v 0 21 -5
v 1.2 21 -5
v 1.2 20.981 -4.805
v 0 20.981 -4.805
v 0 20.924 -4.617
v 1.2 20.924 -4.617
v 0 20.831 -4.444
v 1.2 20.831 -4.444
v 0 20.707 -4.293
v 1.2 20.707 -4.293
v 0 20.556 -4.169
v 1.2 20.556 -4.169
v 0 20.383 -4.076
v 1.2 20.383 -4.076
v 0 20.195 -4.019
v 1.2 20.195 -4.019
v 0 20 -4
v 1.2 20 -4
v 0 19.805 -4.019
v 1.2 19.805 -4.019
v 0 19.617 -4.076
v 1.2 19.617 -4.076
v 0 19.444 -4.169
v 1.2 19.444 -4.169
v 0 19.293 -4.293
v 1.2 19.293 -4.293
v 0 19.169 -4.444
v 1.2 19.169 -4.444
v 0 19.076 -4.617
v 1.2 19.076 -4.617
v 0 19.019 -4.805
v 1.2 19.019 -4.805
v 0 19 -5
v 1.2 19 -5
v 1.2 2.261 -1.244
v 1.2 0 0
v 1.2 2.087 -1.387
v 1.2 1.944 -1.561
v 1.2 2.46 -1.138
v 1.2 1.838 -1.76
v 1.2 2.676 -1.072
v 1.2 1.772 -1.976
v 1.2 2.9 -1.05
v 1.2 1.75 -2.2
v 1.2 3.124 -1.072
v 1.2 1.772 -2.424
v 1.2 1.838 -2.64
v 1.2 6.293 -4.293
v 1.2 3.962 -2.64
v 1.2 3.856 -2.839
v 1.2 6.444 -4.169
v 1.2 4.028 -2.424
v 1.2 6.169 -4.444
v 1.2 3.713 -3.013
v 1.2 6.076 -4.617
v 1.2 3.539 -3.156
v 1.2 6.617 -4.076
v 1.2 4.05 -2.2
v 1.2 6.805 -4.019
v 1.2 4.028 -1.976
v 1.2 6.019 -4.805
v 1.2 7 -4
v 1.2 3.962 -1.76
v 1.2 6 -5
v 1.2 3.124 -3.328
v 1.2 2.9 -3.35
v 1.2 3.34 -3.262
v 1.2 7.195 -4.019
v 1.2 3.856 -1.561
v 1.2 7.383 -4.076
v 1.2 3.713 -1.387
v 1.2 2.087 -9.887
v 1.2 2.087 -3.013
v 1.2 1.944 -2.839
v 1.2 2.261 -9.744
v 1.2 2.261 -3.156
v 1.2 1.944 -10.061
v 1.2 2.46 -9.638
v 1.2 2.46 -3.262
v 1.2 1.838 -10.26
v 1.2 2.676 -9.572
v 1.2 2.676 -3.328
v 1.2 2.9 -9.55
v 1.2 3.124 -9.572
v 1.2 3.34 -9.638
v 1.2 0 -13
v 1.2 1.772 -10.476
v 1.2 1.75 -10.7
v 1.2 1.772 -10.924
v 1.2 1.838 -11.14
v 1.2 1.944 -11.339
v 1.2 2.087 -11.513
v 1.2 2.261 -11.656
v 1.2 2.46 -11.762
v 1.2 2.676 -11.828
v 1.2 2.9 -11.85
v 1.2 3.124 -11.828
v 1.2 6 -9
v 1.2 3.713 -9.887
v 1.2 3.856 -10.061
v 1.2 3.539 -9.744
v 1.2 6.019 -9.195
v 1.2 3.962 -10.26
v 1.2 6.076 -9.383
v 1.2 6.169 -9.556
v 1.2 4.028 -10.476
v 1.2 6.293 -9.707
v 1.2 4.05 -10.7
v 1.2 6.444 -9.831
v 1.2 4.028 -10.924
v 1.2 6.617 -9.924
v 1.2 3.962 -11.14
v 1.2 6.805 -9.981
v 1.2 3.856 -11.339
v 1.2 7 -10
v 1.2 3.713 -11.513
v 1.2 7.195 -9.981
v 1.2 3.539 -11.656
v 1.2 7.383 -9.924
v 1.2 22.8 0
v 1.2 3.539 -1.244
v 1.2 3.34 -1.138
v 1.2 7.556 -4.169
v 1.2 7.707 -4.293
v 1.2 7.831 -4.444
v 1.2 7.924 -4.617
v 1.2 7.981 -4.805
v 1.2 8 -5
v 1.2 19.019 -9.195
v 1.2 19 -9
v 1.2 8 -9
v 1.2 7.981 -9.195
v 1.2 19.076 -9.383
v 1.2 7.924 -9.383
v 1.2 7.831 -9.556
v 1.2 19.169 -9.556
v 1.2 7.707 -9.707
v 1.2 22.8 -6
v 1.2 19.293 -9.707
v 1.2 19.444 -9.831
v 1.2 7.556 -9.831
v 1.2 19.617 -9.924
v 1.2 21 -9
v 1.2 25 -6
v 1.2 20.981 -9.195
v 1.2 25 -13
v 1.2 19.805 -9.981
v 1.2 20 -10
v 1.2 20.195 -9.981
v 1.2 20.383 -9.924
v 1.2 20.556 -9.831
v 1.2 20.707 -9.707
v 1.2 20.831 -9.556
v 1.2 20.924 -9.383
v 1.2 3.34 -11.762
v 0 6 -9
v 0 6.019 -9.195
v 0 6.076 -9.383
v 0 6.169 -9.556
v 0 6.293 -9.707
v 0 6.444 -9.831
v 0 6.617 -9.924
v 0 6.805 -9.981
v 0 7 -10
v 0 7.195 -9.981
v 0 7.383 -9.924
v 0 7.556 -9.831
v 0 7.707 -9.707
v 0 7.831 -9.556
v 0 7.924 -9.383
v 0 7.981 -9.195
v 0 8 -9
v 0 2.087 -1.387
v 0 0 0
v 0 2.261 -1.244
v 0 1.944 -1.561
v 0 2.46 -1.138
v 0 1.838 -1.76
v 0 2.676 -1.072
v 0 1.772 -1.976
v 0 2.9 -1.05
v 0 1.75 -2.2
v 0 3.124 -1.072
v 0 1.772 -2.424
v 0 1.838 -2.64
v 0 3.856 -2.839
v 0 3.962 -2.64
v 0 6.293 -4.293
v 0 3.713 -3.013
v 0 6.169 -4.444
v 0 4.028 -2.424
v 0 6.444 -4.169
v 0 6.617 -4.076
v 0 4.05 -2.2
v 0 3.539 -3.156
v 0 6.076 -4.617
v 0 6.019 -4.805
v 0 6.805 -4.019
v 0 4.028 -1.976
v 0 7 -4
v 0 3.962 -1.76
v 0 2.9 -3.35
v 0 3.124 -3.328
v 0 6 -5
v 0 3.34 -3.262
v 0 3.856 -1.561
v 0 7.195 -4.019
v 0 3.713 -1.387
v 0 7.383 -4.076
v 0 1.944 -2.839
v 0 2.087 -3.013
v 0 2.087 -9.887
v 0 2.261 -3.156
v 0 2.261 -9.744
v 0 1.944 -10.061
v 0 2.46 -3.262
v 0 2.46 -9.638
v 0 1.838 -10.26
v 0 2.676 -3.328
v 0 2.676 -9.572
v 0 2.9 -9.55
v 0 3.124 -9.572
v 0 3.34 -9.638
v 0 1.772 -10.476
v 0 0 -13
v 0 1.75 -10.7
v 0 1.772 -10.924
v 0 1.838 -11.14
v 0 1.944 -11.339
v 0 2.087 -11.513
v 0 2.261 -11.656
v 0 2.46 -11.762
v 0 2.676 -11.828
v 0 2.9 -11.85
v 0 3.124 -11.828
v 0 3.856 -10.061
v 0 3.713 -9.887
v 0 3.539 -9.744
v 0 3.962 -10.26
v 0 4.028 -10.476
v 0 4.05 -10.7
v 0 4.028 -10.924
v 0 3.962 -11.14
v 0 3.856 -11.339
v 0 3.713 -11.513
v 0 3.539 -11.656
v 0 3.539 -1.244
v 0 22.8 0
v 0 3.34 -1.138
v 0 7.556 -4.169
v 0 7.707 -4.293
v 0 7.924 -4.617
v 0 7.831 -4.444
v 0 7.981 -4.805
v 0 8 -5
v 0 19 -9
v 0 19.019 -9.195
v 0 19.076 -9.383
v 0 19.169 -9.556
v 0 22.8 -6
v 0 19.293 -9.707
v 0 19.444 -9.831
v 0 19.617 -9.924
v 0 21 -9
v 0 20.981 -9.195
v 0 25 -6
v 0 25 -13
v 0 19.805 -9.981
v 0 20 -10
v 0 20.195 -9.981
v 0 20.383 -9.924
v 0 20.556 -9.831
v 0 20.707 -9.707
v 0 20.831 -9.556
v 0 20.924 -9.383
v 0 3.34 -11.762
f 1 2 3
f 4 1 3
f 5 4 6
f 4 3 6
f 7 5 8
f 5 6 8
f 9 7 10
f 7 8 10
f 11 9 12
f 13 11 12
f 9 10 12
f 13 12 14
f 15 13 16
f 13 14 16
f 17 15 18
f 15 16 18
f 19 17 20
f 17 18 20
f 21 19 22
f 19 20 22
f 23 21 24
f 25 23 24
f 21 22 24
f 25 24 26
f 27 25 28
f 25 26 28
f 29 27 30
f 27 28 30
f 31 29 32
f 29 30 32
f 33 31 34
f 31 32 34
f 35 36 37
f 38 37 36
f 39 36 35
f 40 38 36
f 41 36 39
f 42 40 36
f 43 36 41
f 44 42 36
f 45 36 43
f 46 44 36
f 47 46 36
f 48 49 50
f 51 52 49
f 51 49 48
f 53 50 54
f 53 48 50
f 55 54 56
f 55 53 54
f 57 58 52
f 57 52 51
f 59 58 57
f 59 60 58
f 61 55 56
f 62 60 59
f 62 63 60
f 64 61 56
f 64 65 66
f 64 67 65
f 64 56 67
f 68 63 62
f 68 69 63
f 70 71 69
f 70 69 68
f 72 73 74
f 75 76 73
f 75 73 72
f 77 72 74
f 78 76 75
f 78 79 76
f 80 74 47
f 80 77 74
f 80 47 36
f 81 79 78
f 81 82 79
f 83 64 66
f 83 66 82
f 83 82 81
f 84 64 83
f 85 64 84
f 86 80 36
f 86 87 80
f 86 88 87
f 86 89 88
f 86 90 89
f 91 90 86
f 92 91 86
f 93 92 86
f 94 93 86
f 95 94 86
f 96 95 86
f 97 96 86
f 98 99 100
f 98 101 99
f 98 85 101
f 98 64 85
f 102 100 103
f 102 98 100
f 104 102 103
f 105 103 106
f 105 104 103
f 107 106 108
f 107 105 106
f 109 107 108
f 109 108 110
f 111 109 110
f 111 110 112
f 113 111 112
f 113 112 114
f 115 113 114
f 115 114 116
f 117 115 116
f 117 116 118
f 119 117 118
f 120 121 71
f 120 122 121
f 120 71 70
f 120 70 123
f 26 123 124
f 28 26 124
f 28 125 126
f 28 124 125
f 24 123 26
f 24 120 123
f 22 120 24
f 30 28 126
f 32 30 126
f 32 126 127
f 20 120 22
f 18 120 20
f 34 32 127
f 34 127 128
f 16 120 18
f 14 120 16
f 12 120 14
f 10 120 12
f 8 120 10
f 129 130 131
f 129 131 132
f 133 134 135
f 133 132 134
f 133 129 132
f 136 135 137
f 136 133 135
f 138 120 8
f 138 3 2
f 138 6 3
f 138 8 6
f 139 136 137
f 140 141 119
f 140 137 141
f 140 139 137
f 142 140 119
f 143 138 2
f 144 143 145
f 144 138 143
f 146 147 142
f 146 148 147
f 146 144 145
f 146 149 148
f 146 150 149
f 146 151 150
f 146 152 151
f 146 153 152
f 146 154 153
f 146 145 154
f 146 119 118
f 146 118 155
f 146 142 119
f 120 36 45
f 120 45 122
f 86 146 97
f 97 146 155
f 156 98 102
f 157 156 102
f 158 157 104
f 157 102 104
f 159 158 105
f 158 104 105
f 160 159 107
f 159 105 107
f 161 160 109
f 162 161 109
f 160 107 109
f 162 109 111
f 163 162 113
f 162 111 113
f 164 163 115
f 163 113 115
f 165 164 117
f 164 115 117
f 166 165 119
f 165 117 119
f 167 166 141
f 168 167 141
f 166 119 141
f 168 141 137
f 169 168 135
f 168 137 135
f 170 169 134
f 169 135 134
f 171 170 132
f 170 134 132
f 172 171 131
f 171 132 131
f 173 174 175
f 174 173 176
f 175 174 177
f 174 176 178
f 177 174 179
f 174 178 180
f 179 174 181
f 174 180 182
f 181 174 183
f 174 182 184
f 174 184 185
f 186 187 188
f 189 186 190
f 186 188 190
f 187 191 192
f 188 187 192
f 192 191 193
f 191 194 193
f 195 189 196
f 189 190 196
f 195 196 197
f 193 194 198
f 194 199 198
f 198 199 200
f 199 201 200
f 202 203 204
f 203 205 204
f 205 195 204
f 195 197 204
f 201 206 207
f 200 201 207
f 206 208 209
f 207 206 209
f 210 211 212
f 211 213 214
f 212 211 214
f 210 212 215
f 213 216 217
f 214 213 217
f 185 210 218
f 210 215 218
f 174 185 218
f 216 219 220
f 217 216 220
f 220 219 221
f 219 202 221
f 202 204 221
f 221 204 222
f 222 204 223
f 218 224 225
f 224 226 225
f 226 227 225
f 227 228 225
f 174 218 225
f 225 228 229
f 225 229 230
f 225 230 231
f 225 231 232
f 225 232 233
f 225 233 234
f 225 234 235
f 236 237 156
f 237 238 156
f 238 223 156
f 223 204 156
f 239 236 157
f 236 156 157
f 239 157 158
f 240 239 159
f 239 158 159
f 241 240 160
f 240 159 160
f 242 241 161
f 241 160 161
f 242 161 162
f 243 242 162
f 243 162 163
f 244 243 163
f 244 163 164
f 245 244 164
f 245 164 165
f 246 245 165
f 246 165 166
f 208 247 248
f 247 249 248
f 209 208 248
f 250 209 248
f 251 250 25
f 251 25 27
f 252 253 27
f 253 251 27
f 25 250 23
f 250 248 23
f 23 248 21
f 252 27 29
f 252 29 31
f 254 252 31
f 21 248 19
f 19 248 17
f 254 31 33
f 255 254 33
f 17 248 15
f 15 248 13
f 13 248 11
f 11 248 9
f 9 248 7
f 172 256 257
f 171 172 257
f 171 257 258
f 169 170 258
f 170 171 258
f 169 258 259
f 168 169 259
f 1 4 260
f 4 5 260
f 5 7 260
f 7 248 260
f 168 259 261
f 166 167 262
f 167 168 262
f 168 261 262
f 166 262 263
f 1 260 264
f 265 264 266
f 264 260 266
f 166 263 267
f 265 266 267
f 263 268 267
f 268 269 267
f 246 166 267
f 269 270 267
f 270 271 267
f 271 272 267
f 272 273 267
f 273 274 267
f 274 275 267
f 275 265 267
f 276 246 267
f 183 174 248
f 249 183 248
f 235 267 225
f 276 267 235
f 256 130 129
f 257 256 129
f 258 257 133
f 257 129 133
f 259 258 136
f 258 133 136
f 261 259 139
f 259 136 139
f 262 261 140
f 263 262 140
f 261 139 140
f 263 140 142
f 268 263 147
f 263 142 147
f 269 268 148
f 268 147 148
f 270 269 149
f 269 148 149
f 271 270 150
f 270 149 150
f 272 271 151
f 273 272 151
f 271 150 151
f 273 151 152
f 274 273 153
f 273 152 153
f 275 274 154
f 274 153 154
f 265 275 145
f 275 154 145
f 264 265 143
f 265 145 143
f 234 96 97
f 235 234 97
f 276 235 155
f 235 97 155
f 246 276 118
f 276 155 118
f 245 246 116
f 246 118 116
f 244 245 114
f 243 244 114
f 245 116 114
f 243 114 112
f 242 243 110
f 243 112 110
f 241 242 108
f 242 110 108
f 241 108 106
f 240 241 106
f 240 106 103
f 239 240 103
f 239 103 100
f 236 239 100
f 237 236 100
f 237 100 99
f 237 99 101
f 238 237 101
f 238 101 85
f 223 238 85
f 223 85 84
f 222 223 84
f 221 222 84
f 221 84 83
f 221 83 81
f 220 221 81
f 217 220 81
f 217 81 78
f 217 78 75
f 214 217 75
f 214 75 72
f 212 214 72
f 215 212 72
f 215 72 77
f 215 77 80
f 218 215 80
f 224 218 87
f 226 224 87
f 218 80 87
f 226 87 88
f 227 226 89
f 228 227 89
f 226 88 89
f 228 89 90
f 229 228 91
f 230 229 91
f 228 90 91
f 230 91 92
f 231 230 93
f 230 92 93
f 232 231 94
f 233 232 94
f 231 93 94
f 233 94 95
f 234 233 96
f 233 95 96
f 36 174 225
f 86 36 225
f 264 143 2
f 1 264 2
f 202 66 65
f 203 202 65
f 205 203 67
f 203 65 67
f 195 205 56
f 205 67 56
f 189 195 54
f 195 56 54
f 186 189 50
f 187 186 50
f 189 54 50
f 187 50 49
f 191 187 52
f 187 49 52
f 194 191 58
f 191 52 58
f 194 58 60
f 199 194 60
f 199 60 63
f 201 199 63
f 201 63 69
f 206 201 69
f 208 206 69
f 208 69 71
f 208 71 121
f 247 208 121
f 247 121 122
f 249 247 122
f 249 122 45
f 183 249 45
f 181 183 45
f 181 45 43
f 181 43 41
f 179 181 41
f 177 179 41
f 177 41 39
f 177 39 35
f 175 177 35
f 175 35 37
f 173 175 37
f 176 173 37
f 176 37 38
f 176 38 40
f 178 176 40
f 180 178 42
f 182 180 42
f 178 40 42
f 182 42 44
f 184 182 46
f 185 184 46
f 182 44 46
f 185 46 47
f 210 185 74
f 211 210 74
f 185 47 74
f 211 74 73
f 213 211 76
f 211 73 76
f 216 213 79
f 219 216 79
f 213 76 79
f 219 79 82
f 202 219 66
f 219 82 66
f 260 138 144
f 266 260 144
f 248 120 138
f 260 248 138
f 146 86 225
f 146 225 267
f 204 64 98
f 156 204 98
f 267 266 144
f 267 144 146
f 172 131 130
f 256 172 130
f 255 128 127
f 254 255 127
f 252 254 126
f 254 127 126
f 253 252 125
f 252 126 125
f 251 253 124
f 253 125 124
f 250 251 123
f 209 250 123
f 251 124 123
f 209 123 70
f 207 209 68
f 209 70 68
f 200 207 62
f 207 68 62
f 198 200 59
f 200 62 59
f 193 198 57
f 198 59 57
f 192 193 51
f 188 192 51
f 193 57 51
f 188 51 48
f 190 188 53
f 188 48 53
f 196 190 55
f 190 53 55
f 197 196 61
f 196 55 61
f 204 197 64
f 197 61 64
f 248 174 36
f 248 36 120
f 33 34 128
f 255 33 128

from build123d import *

# Parameters (mm, degrees)
SKETCH_1_W          = 15
SKETCH_1_H          = 25
EXTRUDE_1_DEPTH     = 1.2
CUT_EXTRUDE_1_REACH = 3.2
SKETCH_2_R          = 1.15
SKETCH_2_W          = 6
SKETCH_2_H          = 2.2
SKETCH_2_W_2        = 2
SKETCH_2_H_2        = 17
SKETCH_3_W          = 2
SKETCH_3_H          = 5
CUT_EXTRUDE_2_DEPTH = 2.2
SKETCH_4_W          = 2
SKETCH_4_H          = 3
CUT_EXTRUDE_3_DEPTH = 2.2


with BuildPart() as part:
    # Эскиз1 → Вытянуть1 (new body)
    with BuildSketch(Plane(origin=(0, 0, 0), x_dir=(0, 0, -1), z_dir=(1, 0, 0))):
        with Locations((7.5, 12.5)):
            Rectangle(SKETCH_1_W, SKETCH_1_H)
    extrude(amount=EXTRUDE_1_DEPTH)

    # Эскиз2 → Вырез-Вытянуть1 (cut, up to next)
    with BuildSketch(Plane(origin=(1.2, 0, 0), x_dir=(0, 0, -1), z_dir=(1, 0, 0)), mode=Mode.PRIVATE) as cut_extrude_1_sk1:
        with Locations((10.7, 2.9)):
            Circle(SKETCH_2_R)
    cut_extrude_1_tool1 = extrude(cut_extrude_1_sk1.sketch, amount=-CUT_EXTRUDE_1_REACH, mode=Mode.PRIVATE) & part.part
    add(cut_extrude_1_tool1.solids().sort_by_distance((1.2, 2.9, -10.7))[0], mode=Mode.SUBTRACT)
    # Эскиз2 → Вырез-Вытянуть1 (cut, up to next)
    with BuildSketch(Plane(origin=(1.2, 0, 0), x_dir=(0, 0, -1), z_dir=(1, 0, 0)), mode=Mode.PRIVATE) as cut_extrude_1_sk2:
        with Locations((2.2, 2.9)):
            Circle(SKETCH_2_R)
    cut_extrude_1_tool2 = extrude(cut_extrude_1_sk2.sketch, amount=-CUT_EXTRUDE_1_REACH, mode=Mode.PRIVATE) & part.part
    add(cut_extrude_1_tool2.solids().sort_by_distance((1.2, 2.9, -2.2))[0], mode=Mode.SUBTRACT)
    # Эскиз2 → Вырез-Вытянуть1 (cut, up to next)
    with BuildSketch(Plane(origin=(1.2, 0, 0), x_dir=(0, 0, -1), z_dir=(1, 0, 0)), mode=Mode.PRIVATE) as cut_extrude_1_sk3:
        with Locations((3, 23.9)):
            Rectangle(SKETCH_2_W, SKETCH_2_H)
    cut_extrude_1_tool3 = extrude(cut_extrude_1_sk3.sketch, amount=-CUT_EXTRUDE_1_REACH, mode=Mode.PRIVATE) & part.part
    add(cut_extrude_1_tool3.solids().sort_by_distance((1.2, 23.9, -3))[0], mode=Mode.SUBTRACT)
    # Эскиз2 → Вырез-Вытянуть1 (cut, up to next)
    with BuildSketch(Plane(origin=(1.2, 0, 0), x_dir=(0, 0, -1), z_dir=(1, 0, 0)), mode=Mode.PRIVATE) as cut_extrude_1_sk4:
        with BuildLine():
            Line((5, 6), (9, 6))
            ThreePointArc((9, 6), (10, 7), (9, 8))
            Line((9, 8), (9, 19))
            ThreePointArc((9, 19), (10, 20), (9, 21))
            Line((9, 21), (5, 21))
            ThreePointArc((5, 21), (4, 20), (5, 19))
            Line((5, 19), (5, 8))
            ThreePointArc((5, 8), (4, 7), (5, 6))
        make_face()
    cut_extrude_1_tool4 = extrude(cut_extrude_1_sk4.sketch, amount=-CUT_EXTRUDE_1_REACH, mode=Mode.PRIVATE) & part.part
    add(cut_extrude_1_tool4.solids().sort_by_distance((1.2, 13.5, -7))[0], mode=Mode.SUBTRACT)
    # Эскиз2 → Вырез-Вытянуть1 (cut, up to next)
    with BuildSketch(Plane(origin=(1.2, 0, 0), x_dir=(0, 0, -1), z_dir=(1, 0, 0)), mode=Mode.PRIVATE) as cut_extrude_1_sk5:
        with Locations((14, 13.5)):
            Rectangle(SKETCH_2_W_2, SKETCH_2_H_2)
    cut_extrude_1_tool5 = extrude(cut_extrude_1_sk5.sketch, amount=-CUT_EXTRUDE_1_REACH, mode=Mode.PRIVATE) & part.part
    add(cut_extrude_1_tool5.solids().sort_by_distance((1.2, 13.5, -14))[0], mode=Mode.SUBTRACT)

    # Эскиз3 → Вырез-Вытянуть2 (cut, through all)
    with BuildSketch(Plane(origin=(1.2, 0, 0), x_dir=(0, 0, -1), z_dir=(1, 0, 0))):
        with Locations((14, 2.5)):
            Rectangle(SKETCH_3_W, SKETCH_3_H)
    extrude(amount=-CUT_EXTRUDE_2_DEPTH, mode=Mode.SUBTRACT)

    # Эскиз4 → Вырез-Вытянуть3 (cut, through all)
    with BuildSketch(Plane(origin=(1.2, 0, 0), x_dir=(0, 0, -1), z_dir=(1, 0, 0))):
        with Locations((14, 23.5)):
            Rectangle(SKETCH_4_W, SKETCH_4_H)
    extrude(amount=-CUT_EXTRUDE_3_DEPTH, mode=Mode.SUBTRACT)


solid = part.part
